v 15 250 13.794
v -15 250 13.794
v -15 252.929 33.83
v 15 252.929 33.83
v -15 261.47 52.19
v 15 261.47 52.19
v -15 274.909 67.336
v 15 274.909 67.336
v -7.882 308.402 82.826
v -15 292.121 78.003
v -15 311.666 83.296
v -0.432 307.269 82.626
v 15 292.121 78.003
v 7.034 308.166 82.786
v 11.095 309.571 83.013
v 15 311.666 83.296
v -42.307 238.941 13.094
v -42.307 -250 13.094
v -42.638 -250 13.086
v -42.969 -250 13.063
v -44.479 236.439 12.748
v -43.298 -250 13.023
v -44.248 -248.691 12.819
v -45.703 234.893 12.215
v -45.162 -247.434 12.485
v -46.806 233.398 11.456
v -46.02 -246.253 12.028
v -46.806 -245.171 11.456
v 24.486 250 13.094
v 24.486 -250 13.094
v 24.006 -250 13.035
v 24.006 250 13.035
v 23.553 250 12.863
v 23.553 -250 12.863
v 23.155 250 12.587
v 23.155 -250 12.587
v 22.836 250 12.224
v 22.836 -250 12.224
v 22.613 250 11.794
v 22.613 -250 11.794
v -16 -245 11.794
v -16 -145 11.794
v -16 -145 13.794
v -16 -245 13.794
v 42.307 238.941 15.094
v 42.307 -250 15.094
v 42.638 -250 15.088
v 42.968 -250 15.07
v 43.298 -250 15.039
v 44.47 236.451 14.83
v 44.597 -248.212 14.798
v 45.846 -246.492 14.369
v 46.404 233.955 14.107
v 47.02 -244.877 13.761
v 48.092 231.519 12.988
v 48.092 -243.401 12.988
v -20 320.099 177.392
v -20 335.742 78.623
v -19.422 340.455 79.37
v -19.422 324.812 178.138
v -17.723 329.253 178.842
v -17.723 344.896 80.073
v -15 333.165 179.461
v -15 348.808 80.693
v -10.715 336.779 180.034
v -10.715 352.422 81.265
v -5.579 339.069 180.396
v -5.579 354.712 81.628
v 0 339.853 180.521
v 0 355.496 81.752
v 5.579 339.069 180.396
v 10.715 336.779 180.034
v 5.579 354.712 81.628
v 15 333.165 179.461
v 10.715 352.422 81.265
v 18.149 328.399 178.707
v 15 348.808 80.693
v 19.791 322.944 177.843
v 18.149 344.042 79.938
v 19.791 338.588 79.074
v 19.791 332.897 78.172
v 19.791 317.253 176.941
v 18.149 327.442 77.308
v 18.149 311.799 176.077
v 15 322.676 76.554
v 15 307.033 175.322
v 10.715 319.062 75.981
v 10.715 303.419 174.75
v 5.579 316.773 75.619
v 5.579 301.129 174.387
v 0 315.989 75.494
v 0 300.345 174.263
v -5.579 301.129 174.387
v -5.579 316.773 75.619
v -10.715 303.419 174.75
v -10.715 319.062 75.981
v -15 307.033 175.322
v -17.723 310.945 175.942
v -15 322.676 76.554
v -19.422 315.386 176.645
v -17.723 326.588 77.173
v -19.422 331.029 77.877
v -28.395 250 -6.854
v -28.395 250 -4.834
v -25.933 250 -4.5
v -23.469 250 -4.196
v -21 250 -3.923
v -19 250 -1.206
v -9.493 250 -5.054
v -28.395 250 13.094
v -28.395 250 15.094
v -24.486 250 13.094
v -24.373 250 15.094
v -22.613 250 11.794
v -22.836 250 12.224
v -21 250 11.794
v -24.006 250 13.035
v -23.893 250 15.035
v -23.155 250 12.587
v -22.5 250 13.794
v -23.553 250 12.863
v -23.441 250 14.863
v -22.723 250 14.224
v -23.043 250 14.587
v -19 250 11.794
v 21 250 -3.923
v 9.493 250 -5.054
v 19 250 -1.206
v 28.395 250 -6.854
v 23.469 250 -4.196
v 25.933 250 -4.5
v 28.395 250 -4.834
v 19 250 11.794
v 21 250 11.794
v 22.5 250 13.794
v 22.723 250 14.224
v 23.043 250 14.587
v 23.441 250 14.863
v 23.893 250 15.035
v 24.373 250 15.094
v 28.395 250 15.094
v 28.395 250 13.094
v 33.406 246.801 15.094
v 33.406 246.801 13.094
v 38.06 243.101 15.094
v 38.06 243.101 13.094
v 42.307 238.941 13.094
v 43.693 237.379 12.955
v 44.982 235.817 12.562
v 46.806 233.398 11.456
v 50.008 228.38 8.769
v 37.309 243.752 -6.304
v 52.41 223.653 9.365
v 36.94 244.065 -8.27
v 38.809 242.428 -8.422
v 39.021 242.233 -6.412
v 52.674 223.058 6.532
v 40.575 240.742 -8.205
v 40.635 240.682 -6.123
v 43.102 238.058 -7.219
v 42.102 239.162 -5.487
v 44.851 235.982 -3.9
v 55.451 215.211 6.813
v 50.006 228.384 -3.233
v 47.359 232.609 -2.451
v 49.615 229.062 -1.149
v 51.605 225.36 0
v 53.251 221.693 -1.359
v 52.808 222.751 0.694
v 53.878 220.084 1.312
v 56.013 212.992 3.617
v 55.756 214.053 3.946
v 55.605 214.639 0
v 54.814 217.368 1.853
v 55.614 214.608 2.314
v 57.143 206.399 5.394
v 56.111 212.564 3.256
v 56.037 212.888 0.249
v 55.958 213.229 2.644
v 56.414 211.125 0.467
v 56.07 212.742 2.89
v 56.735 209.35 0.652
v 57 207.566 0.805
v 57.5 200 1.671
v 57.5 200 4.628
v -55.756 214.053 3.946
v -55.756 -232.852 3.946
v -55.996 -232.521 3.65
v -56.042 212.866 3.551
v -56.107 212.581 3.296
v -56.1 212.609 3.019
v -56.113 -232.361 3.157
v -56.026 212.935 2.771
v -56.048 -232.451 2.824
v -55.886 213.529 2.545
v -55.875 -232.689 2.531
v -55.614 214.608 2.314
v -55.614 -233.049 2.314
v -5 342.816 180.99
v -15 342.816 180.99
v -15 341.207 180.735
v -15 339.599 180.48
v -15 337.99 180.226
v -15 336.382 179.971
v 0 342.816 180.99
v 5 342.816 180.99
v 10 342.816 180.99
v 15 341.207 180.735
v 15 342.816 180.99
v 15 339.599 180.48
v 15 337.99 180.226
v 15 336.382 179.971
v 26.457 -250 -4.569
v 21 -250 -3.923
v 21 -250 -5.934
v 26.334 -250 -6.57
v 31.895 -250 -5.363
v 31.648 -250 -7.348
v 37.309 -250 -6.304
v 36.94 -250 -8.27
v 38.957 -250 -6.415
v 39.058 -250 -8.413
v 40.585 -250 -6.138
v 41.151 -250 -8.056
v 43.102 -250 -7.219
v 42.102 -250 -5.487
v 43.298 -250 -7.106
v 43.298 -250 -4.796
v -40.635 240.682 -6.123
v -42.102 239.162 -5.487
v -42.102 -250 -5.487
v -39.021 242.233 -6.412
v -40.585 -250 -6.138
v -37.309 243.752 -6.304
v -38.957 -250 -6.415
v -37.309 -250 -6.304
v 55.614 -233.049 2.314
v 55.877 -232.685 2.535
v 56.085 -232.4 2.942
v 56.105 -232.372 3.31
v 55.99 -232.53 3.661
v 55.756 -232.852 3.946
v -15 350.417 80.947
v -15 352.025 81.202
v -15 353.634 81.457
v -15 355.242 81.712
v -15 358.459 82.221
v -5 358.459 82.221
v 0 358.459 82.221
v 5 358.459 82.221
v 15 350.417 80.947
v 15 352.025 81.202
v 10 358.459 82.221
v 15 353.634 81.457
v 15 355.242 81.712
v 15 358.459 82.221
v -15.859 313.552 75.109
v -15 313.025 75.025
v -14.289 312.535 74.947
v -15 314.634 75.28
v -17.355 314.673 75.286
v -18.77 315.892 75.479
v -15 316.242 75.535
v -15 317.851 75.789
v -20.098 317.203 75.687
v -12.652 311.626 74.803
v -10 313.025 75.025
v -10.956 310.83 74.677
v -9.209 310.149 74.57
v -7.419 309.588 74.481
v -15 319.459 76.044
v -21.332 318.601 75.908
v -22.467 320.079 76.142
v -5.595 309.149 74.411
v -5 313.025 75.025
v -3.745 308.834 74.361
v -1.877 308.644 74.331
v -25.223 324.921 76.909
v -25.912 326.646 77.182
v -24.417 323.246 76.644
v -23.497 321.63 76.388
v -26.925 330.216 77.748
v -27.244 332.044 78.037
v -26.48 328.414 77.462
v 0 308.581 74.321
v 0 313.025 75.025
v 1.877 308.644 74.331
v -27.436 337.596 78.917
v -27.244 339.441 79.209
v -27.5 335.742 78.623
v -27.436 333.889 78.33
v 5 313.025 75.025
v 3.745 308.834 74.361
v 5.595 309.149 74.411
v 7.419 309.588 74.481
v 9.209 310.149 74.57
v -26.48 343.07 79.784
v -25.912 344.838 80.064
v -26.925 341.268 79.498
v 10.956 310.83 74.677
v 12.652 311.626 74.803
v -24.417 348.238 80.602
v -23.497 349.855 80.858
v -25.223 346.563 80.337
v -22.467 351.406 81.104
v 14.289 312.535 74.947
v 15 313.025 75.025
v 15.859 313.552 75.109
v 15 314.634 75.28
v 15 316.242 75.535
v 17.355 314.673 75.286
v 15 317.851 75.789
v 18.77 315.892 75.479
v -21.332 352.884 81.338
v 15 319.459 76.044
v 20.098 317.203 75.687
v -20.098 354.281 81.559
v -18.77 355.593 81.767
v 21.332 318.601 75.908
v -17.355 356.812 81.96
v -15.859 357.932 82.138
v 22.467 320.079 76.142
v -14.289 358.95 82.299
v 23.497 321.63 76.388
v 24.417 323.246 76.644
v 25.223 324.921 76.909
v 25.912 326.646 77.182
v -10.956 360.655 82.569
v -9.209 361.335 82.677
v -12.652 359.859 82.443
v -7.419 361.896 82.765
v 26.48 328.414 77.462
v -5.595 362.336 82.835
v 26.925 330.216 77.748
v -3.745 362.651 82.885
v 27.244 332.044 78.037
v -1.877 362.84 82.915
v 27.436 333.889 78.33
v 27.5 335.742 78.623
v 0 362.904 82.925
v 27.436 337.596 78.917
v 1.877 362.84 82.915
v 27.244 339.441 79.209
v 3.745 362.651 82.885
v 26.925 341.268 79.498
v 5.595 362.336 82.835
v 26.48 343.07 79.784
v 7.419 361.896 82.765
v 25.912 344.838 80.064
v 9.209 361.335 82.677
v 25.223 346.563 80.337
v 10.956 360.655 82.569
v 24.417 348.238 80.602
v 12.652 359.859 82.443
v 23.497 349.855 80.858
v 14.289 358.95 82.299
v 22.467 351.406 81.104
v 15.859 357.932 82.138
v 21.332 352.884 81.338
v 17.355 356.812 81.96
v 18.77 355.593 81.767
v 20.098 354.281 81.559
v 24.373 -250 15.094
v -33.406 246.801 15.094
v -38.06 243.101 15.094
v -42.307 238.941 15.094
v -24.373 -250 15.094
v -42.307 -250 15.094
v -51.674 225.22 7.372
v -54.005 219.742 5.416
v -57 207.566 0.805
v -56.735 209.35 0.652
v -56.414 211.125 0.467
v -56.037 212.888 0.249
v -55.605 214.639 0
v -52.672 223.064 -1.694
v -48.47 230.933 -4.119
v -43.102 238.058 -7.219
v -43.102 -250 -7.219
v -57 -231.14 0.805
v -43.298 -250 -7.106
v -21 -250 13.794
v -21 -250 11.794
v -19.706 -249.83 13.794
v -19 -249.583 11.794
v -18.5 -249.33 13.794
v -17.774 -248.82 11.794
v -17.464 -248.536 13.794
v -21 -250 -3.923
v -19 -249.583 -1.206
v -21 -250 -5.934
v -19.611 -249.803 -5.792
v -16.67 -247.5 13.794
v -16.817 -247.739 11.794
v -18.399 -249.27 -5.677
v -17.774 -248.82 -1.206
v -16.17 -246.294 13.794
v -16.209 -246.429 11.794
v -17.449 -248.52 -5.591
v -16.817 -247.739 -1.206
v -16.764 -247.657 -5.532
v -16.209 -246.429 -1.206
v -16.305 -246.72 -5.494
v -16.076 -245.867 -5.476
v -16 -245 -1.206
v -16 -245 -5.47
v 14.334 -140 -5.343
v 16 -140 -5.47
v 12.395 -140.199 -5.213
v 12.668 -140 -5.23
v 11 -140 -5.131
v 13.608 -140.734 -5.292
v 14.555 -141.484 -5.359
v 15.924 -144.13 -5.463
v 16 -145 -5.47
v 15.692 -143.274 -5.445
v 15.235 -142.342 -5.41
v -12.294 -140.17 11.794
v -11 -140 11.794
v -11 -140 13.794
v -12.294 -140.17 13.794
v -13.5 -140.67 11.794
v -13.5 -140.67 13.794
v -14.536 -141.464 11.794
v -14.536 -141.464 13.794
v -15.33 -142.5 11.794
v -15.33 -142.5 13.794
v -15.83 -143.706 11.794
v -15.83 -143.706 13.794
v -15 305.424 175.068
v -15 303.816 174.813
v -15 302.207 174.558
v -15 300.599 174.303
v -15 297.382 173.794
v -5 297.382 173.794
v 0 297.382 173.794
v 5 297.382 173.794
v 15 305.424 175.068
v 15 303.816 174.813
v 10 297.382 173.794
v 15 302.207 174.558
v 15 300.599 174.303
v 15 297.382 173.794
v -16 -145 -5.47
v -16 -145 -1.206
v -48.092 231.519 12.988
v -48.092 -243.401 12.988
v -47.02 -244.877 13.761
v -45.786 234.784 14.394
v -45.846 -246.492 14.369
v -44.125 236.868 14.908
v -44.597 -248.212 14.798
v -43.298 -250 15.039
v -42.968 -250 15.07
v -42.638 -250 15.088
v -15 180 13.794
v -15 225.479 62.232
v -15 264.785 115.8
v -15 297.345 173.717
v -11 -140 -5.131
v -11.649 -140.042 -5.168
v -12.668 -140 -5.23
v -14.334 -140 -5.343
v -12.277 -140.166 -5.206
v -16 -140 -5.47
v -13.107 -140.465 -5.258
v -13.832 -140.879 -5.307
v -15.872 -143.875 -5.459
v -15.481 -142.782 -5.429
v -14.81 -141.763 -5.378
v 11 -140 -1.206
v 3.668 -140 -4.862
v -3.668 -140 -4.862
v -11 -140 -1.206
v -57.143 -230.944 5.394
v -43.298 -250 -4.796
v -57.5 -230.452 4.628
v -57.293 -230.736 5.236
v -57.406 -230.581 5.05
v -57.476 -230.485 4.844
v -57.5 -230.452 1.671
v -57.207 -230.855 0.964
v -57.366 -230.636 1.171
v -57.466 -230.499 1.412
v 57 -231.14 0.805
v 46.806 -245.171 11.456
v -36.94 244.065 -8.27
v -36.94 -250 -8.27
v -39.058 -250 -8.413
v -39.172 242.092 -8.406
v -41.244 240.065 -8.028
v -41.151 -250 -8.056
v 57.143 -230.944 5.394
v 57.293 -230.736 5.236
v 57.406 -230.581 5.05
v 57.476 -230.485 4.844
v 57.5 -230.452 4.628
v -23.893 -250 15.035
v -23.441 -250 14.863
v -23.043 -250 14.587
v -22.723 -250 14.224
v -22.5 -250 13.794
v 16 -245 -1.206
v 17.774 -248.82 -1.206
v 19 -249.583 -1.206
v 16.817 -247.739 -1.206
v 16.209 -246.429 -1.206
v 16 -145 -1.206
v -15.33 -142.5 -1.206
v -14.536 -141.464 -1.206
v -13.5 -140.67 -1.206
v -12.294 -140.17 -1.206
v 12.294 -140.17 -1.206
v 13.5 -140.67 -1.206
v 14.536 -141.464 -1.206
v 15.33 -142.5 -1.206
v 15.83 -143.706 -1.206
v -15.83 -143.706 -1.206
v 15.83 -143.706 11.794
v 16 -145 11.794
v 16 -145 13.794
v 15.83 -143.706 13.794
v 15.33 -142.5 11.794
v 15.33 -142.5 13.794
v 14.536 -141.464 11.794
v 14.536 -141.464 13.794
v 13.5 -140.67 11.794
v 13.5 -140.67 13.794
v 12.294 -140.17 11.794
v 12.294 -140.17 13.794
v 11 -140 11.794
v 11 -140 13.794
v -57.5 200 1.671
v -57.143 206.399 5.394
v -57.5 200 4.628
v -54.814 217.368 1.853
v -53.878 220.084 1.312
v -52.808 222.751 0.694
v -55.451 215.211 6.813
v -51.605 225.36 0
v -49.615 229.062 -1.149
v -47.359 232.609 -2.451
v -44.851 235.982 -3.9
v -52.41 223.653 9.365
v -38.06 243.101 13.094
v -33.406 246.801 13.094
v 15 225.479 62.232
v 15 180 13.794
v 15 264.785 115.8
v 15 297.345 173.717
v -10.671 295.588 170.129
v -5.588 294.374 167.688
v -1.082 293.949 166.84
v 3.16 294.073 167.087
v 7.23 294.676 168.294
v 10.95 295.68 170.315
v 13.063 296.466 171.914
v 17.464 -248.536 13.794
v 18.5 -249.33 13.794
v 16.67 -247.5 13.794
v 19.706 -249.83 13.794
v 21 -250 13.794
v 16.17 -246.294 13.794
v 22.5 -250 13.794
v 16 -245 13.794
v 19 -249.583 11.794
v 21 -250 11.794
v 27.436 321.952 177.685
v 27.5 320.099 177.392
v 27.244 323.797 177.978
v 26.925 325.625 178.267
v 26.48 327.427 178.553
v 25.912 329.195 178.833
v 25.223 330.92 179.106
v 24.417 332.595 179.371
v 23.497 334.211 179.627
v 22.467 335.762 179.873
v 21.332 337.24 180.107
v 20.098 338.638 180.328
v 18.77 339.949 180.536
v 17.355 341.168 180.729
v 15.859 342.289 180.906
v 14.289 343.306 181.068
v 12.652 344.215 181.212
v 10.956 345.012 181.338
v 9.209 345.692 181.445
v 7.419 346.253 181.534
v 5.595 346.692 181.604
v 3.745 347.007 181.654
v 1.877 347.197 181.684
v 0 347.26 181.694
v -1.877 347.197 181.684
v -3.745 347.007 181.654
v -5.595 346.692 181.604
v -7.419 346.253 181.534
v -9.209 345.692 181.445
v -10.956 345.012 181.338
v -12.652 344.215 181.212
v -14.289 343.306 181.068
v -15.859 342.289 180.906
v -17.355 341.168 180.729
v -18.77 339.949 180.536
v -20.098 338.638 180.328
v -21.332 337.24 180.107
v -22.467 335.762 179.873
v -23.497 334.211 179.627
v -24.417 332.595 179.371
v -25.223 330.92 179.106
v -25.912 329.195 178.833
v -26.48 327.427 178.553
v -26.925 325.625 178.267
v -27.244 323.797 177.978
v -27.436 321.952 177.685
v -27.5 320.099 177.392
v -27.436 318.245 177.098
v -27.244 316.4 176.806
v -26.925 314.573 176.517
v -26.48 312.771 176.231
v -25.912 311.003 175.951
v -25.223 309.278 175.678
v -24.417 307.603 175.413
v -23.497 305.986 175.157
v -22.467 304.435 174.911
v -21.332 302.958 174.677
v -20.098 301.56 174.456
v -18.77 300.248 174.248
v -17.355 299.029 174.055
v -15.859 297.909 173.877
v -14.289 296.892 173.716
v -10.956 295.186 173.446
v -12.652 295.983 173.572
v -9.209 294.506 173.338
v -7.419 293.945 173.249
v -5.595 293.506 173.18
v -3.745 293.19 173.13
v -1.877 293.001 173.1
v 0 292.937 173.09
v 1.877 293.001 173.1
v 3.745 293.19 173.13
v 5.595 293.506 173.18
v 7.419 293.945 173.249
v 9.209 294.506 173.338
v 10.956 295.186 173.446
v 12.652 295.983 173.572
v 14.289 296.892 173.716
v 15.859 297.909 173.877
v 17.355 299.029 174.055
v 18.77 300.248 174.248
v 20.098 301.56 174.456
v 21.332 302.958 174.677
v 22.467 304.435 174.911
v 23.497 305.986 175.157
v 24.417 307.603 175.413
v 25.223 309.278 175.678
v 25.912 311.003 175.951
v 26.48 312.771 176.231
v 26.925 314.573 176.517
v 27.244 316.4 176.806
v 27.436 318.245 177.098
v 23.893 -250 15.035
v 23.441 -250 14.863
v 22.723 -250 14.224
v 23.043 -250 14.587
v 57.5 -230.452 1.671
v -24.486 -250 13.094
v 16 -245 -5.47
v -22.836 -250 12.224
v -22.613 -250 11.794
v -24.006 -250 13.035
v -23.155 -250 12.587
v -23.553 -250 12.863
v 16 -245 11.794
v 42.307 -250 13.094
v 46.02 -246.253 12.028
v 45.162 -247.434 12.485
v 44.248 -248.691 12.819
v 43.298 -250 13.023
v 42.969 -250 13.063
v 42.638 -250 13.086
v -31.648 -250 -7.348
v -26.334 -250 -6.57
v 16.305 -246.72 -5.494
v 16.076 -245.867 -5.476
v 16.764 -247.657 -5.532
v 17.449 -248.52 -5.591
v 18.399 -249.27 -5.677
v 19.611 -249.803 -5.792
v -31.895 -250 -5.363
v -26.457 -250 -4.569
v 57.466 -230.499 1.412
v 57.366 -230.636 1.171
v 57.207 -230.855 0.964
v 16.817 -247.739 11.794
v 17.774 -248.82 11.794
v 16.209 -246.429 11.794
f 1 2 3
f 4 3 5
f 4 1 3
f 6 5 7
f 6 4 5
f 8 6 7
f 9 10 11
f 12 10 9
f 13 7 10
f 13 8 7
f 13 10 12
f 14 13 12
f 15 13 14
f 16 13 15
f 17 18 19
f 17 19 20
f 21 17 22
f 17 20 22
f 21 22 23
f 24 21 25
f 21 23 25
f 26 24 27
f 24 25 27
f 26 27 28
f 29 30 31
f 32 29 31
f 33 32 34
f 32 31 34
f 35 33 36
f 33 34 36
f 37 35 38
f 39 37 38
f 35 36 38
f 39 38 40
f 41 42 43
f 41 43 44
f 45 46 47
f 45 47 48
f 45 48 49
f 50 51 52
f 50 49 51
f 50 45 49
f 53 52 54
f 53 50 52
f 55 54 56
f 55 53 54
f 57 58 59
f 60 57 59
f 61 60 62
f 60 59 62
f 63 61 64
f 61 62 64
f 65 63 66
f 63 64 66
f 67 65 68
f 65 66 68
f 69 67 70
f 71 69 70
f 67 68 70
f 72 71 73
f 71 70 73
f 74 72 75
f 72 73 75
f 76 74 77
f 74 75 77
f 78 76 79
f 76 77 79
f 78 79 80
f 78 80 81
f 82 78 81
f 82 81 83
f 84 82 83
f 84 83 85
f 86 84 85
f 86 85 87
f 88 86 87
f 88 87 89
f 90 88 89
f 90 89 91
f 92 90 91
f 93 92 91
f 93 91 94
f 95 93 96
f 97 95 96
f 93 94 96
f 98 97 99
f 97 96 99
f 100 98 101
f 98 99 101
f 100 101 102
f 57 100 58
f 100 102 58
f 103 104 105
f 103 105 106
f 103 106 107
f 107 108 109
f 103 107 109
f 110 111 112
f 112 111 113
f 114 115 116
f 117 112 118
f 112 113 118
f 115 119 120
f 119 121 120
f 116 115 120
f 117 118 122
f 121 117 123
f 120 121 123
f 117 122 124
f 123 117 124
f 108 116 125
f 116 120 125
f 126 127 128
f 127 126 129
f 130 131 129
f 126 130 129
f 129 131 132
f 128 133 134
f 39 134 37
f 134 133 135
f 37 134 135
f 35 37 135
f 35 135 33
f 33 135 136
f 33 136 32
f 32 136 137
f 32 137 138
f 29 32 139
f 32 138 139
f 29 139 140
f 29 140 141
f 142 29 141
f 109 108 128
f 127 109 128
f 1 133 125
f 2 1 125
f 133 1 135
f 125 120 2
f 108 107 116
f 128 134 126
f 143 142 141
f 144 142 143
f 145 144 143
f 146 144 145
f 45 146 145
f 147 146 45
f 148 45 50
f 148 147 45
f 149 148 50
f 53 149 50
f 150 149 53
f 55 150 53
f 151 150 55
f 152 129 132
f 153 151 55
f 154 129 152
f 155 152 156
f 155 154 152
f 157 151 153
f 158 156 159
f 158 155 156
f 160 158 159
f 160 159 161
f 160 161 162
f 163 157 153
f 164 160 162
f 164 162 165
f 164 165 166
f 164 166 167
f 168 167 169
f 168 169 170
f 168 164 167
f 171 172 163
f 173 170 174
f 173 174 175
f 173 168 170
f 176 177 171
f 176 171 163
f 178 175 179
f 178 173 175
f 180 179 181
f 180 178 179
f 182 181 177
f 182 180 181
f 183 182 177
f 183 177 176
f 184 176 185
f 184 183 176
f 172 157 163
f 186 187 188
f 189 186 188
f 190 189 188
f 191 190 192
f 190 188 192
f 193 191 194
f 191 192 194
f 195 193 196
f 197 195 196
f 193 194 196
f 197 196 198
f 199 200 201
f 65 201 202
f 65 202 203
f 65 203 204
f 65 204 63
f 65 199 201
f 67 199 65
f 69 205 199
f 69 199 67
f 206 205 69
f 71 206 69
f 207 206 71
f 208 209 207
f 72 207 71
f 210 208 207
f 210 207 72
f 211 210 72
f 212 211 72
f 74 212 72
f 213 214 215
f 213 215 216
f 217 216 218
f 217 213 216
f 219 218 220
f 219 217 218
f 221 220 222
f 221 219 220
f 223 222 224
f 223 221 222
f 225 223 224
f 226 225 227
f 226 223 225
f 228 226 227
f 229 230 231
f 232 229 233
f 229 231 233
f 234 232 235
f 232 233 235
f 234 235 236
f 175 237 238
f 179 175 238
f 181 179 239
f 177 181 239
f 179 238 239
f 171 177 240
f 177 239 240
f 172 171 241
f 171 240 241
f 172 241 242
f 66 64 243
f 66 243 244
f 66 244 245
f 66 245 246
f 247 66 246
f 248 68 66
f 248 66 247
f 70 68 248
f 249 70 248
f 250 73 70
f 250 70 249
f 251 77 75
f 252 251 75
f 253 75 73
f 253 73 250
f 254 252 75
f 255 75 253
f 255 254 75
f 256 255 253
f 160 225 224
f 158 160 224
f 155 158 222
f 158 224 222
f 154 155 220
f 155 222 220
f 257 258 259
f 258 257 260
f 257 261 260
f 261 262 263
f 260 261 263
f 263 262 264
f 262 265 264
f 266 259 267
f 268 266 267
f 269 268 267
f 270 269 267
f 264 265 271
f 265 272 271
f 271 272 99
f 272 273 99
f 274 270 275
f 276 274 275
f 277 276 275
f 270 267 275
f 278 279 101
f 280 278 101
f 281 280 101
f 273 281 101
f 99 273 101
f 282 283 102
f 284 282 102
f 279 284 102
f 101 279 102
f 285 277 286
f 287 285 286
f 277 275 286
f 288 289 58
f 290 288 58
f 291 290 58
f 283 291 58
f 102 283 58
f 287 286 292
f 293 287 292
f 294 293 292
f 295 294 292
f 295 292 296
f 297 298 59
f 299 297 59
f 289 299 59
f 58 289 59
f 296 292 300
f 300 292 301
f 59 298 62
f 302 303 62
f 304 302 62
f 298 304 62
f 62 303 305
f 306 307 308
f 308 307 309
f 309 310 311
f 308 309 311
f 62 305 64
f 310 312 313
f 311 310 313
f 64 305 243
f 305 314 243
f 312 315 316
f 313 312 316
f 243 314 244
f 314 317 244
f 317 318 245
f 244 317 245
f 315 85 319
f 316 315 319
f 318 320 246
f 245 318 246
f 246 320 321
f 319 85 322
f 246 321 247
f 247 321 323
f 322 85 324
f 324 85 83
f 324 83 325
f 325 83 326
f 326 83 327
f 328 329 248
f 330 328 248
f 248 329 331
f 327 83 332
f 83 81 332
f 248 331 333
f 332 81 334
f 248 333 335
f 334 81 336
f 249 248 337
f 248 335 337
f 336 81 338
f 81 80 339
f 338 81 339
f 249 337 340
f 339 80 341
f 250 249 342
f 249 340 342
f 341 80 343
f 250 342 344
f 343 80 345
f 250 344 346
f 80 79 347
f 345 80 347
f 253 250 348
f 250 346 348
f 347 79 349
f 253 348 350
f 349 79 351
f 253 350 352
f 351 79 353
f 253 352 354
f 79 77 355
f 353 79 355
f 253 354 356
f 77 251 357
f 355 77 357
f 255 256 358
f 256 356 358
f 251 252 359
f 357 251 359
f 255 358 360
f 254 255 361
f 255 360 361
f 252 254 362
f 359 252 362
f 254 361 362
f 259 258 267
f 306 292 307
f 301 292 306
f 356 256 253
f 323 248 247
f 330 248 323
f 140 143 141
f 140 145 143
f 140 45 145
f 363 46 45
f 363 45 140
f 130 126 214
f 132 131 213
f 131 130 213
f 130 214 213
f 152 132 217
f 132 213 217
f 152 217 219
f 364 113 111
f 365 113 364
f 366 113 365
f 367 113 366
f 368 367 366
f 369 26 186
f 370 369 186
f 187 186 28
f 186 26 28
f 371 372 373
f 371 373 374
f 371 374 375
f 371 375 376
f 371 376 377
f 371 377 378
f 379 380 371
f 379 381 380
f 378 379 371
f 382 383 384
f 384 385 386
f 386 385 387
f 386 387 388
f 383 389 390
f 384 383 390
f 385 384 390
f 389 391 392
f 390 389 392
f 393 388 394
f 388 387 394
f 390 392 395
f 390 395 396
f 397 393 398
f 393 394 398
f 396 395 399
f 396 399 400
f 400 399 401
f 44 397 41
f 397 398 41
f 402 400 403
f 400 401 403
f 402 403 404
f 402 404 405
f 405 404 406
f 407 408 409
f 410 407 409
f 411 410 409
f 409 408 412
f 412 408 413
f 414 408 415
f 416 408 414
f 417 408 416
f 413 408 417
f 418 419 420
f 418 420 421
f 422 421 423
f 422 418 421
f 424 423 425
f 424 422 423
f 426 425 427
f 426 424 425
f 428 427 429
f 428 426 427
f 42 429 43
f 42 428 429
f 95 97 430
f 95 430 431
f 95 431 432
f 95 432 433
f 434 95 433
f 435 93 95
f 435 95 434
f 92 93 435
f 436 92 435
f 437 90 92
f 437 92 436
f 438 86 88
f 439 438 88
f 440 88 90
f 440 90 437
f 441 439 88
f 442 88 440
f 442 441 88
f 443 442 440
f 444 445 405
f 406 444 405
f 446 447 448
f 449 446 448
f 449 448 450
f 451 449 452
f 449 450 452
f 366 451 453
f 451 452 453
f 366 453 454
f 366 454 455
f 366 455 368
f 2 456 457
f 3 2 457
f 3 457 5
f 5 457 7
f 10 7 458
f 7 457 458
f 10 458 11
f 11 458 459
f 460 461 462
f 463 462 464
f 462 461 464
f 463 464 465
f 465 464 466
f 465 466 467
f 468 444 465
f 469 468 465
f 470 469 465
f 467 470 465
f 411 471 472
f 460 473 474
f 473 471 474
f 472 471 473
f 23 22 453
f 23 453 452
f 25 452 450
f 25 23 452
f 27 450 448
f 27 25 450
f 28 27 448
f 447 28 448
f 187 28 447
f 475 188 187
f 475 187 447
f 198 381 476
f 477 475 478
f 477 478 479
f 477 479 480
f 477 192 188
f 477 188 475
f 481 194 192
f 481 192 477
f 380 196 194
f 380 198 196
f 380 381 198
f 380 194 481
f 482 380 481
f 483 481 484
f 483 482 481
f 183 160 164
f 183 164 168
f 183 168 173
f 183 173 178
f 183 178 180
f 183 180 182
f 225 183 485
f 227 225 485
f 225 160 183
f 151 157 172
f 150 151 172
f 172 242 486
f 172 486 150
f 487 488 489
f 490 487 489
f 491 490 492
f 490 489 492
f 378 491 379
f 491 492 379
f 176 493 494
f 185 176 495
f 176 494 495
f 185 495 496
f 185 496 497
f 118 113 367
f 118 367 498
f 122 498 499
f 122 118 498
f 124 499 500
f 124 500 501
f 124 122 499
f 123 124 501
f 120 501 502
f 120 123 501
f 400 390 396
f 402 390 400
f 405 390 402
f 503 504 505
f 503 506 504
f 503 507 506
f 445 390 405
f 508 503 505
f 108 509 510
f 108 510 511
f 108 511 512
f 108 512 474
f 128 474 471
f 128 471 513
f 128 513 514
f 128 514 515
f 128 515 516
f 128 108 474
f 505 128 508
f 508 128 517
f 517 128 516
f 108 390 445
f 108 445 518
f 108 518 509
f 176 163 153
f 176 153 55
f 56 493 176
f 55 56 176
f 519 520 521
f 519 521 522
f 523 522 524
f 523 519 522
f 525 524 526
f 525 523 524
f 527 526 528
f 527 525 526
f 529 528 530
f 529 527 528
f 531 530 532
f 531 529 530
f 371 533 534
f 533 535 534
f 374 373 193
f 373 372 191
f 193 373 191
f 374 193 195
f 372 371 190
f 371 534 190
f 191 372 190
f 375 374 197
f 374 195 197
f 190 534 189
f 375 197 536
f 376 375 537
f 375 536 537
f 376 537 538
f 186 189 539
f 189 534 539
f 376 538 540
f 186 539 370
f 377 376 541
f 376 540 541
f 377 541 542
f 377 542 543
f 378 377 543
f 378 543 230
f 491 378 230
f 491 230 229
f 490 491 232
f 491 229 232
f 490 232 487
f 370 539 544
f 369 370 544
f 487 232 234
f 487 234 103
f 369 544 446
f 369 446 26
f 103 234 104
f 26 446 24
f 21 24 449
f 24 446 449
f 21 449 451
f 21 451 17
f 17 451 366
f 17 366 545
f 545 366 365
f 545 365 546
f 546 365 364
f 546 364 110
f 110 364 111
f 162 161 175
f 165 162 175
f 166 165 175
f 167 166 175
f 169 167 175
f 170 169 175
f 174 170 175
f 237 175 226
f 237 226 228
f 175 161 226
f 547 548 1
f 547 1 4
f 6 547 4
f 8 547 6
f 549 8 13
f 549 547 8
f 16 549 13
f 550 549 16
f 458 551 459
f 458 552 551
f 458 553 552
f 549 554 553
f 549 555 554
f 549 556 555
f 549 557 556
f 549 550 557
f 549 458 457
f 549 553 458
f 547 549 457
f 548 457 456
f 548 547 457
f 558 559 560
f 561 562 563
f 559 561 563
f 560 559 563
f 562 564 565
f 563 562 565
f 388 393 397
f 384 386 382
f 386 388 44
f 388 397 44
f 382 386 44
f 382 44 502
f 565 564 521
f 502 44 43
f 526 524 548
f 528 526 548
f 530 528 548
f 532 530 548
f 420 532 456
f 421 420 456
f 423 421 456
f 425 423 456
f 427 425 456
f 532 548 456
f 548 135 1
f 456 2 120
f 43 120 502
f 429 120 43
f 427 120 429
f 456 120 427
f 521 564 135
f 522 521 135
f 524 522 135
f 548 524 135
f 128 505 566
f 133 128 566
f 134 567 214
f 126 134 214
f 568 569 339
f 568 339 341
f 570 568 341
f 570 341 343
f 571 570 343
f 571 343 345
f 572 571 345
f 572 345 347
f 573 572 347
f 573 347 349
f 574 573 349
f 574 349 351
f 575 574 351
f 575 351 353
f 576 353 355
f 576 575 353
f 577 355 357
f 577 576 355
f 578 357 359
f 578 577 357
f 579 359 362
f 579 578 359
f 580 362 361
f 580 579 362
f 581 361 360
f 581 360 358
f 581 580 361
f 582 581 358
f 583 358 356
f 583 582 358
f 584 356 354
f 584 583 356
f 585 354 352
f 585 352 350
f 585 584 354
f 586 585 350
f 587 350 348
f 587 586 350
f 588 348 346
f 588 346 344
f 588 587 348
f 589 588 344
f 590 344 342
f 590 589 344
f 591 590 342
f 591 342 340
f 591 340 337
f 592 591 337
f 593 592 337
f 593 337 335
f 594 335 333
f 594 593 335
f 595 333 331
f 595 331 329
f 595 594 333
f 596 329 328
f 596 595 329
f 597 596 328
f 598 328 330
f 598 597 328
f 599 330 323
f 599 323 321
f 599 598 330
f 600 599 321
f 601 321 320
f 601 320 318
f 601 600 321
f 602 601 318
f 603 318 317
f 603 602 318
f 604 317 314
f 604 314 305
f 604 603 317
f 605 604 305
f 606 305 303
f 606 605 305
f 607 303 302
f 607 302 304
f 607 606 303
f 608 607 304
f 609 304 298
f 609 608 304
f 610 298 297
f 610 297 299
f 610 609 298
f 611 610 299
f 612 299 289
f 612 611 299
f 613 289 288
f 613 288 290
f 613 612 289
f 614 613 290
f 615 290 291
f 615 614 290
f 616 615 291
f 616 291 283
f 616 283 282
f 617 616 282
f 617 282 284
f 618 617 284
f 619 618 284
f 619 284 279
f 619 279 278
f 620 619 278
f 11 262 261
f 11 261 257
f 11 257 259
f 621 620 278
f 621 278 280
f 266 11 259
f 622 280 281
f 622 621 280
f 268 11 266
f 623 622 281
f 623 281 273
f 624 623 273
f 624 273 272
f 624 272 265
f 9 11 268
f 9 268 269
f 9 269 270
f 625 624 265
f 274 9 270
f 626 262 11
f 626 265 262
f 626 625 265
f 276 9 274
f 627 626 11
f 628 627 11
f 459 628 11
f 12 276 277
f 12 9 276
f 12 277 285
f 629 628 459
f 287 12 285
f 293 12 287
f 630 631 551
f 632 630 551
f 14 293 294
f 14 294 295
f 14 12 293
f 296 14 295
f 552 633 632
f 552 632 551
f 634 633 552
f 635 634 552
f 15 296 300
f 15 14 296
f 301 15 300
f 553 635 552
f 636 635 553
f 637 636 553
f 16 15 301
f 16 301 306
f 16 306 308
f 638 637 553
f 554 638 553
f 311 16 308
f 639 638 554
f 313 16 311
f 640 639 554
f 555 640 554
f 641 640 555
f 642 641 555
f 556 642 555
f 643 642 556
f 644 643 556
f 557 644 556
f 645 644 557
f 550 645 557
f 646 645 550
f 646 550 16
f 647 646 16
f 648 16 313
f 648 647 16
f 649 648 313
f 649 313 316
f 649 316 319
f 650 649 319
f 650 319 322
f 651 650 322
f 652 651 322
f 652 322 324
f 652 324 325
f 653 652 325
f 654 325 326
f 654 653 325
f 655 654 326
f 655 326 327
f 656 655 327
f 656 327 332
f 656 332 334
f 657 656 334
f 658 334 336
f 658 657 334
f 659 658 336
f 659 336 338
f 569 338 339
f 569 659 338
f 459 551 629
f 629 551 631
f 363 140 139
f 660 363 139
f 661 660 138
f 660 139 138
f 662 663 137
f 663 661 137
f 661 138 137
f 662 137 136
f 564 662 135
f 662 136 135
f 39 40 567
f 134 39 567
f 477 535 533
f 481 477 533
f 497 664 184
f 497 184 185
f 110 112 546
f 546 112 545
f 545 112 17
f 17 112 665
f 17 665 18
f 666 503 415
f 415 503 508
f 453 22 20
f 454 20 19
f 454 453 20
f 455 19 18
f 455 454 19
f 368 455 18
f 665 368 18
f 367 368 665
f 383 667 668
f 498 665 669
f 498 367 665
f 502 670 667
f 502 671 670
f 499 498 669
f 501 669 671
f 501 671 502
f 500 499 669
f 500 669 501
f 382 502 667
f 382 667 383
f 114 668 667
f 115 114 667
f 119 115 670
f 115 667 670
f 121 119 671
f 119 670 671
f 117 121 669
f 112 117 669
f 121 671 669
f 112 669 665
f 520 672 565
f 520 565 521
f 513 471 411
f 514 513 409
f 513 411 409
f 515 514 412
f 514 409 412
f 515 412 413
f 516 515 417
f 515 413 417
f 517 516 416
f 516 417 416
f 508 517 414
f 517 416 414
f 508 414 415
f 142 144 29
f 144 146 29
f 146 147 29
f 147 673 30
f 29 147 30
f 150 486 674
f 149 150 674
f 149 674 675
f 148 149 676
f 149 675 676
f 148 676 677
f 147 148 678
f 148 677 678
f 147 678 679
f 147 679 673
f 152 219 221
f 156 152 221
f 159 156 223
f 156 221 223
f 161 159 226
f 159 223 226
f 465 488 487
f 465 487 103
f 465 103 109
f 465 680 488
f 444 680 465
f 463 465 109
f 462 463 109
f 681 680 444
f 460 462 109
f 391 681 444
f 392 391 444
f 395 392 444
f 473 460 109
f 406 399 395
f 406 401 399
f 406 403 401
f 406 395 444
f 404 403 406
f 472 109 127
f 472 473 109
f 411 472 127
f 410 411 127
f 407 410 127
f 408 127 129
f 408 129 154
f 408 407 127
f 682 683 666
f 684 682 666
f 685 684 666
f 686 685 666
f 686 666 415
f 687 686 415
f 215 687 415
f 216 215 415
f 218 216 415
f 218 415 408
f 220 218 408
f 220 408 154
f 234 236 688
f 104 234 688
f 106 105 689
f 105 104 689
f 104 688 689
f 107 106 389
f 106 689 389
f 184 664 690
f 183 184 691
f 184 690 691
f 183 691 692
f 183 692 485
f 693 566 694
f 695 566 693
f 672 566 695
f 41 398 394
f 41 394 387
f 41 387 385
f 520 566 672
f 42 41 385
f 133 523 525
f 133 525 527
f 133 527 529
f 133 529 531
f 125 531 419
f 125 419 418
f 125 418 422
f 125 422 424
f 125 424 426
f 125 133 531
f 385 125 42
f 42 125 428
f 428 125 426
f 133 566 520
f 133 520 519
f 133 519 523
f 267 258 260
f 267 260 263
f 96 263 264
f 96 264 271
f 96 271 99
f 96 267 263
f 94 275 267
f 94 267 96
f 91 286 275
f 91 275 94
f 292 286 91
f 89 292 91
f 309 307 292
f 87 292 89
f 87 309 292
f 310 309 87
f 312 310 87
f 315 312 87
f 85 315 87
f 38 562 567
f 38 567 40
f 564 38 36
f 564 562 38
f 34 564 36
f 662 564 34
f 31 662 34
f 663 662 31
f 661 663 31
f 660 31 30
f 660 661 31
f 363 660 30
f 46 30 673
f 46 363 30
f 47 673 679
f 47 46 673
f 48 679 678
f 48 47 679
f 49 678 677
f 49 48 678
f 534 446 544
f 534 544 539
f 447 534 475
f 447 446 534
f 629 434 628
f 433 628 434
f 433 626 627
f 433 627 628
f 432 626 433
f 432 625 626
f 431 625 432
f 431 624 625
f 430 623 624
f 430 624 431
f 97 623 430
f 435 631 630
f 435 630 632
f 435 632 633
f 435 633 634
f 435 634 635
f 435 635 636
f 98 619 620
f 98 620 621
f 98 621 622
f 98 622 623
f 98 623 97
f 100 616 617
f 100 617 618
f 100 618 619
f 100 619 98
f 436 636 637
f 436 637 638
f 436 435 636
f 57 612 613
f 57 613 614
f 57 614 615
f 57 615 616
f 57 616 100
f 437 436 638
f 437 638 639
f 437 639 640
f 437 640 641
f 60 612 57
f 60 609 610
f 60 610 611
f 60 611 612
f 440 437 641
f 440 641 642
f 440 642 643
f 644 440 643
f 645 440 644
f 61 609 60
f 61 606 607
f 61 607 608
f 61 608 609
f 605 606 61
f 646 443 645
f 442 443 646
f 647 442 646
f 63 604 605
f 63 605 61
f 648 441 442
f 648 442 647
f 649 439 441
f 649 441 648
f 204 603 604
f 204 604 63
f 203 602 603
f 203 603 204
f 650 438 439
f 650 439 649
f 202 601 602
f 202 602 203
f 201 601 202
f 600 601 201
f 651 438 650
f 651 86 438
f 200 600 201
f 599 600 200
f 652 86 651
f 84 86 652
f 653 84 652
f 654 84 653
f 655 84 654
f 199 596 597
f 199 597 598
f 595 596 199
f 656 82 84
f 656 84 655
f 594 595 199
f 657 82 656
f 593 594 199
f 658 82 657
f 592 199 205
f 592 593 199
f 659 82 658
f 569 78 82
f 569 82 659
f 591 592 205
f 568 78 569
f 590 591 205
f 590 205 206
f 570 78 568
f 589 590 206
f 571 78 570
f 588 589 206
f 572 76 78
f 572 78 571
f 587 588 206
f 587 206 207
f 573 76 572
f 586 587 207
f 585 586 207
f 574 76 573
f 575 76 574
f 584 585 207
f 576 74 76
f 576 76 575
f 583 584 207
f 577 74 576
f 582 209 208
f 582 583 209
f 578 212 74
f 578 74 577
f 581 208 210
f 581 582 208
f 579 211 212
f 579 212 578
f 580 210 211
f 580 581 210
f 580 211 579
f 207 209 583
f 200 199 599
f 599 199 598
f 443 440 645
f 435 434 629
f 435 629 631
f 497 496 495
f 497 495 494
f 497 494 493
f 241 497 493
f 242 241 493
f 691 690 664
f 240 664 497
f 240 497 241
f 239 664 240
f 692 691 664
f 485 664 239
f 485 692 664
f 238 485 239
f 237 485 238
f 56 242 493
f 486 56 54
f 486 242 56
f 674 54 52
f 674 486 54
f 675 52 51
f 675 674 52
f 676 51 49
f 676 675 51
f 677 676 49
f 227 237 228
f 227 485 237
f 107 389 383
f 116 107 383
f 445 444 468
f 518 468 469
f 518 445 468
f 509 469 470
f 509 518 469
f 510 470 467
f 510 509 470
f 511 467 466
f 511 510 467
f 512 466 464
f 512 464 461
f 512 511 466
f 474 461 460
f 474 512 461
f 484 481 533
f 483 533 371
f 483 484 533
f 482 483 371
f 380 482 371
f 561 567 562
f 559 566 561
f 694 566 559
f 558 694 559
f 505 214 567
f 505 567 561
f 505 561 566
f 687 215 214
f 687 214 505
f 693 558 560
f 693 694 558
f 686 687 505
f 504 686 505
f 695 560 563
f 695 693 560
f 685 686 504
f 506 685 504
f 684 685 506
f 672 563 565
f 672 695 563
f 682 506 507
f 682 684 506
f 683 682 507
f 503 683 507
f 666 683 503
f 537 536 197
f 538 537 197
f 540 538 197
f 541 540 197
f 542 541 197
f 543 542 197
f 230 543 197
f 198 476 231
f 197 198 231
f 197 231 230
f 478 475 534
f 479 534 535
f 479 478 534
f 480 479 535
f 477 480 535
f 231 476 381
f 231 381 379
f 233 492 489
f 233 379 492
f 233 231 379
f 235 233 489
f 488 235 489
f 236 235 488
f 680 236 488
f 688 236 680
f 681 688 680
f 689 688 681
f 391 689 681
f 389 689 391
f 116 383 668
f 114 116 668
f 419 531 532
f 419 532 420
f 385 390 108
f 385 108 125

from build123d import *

# Parameters (mm, degrees)
F1_DEPTH       = 250
F2_W           = 38
F2_H           = 13
F3_DEPTH       = 500.001
F4_T1_DEPTH    = 509.3674969976
F5_R           = 9
F6_R           = 1
F8_DEPTH       = 500.001
F10_DEPTH      = 8.4253865001
F10_DEPTH_BACK = 15.0949186811
F12_DEPTH      = 15
F13_R          = 27.5
F14_DEPTH      = 100
F16_D          = 40
F18_DEPTH      = 8.4253866128
F18_DEPTH_BACK = 181.6948592657
F19_T1_DEPTH   = 2
F19_T6_DEPTH   = 16.7634824315
F19_S7_R       = 200
F19_T8_DEPTH   = 11
F19_T12_DEPTH  = 16.7634824315
F19_S13_R      = 200
F19_T14_DEPTH  = 11
F19_T15_DEPTH  = 27
F19_T17_DEPTH  = 29.2634824315


# Not quite as in the source:
# - a fillet or chamfer that OpenCascade refuses, or shapes differently, is made with other operations: its cross-section is extruded or revolved along the edge and cut away or added


with BuildPart() as f1:
    # F0 (on Front) → F1 (new body, symmetric)
    with BuildSketch(Plane.XZ):
        with BuildLine():
            Line((22.5, 13.7939186811), (0, 13.7939186811))
            Line((0, 13.7939186811), (-22.5, 13.7939186811))
            Line((-22.5, 13.7939186811), (-22.5, 15.0939186811))
            Line((-22.5, 15.0939186811), (-45.5824640741, 15.0939186811))
            Line((-45.5824640741, 15.0939186811), (-57.5, 5.0939186811))
            Line((-57.5, 5.0939186811), (-57.5, 1.0939186811))
            Line((-57.5, 1.0939186811), (-40.1794919243, -8.9060813189))
            ThreePointArc((-40.1794919243, -8.9060813189), (0, -4.8285364604), (40.1794919243, -8.9060813189))
            Line((40.1794919243, -8.9060813189), (57.5, 1.0939186811))
            Line((57.5, 1.0939186811), (57.5, 5.0939186811))
            Line((57.5, 5.0939186811), (45.5824640741, 15.0939186811))
            Line((45.5824640741, 15.0939186811), (22.5, 15.0939186811))
            Line((22.5, 15.0939186811), (22.5, 13.7939186811))
        make_face()
    extrude(amount=F1_DEPTH, both=True)

    # F2 (on face) → F3 (cut, through all)
    with BuildSketch(Plane.XZ.offset(250)):
        with Locations((0, 5.2939186811)):
            Rectangle(F2_W, F2_H)
    extrude(amount=-F3_DEPTH, mode=Mode.SUBTRACT)

    # F4: fillet of radius 2 on 2 edges, made by hand

    # F4_s2 → F4_t1 (cut)
    with BuildSketch(Plane.XZ.offset(-254.6837484988)):
        with BuildLine():
            ThreePointArc((24.3734993995, 15.0939186811), (23.2333239744, 14.7370863537), (22.5, 13.7939186811))
            Line((22.5, 13.7939186811), (22.5, 15.0939186811))
            Line((22.5, 15.0939186811), (24.3734993995, 15.0939186811))
        make_face()
        with BuildLine():
            ThreePointArc((-24.3734993995, 15.0939186811), (-23.2333239744, 14.7370863537), (-22.5, 13.7939186811))
            Line((-22.5, 13.7939186811), (-22.5, 15.0939186811))
            Line((-22.5, 15.0939186811), (-24.3734993995, 15.0939186811))
        make_face()
    extrude(amount=F4_T1_DEPTH, mode=Mode.SUBTRACT)

    # F5
    f5_edges = [f1.edges().sort_by_distance(p)[0] for p in [
        (45.582464, 0, 15.093919),
        (-45.582464, 0, 15.093919),
        (-40.179492, 0, -8.906081),
        (40.179492, 0, -8.906081),
    ]]
    fillet(f5_edges, radius=F5_R)

    # F6
    f6_edges = [f1.edges().sort_by_distance(p)[0] for p in [
        (57.5, 0, 1.093919),
        (57.5, 0, 5.093919),
        (-57.5, 0, 5.093919),
        (-57.5, 0, 1.093919),
    ]]
    fillet(f6_edges, radius=F6_R)

    # F7 (on face) → F8 (cut, through all)
    with BuildSketch(Plane.XZ.offset(250)):
        with BuildLine():
            Line((-55.6135241478, 2.3141624168), (-42.1022690923, -5.4865643266))
            ThreePointArc((-42.1022690923, -5.4865643266), (-39.7790673433, -6.3247593796), (-37.3093701274, -6.3039513313))
            ThreePointArc((-37.3093701274, -6.3039513313), (-29.1789785809, -4.9471035834), (-21, -3.9230860615))
            Line((-21, -3.9230860615), (-21, 11.7939186811))
            Line((-21, 11.7939186811), (-22.6125713953, 11.7939186811))
            ThreePointArc((-22.6125713953, 11.7939186811), (-23.3458953697, 12.7370863537), (-24.4860707948, 13.0939186811))
            Line((-24.4860707948, 13.0939186811), (-42.3067319657, 13.0939186811))
            ThreePointArc((-42.3067319657, 13.0939186811), (-44.7008729689, 12.6717670266), (-46.8062452335, 11.456229783))
            Line((-46.8062452335, 11.456229783), (-55.7563117574, 3.9462322637))
            ThreePointArc((-55.7563117574, 3.9462322637), (-56.1097188459, 3.0930320778), (-55.6135241478, 2.3141624168))
        make_face()
        with BuildLine():
            ThreePointArc((21, -3.9230860615), (29.1789785809, -4.9471035834), (37.3093701274, -6.3039513313))
            ThreePointArc((37.3093701274, -6.3039513313), (39.7790673433, -6.3247593796), (42.1022690923, -5.4865643266))
            Line((42.1022690923, -5.4865643266), (55.6135241478, 2.3141624168))
            ThreePointArc((55.6135241478, 2.3141624168), (56.1097188459, 3.0930320778), (55.7563117574, 3.9462322637))
            Line((55.7563117574, 3.9462322637), (46.8062452335, 11.456229783))
            ThreePointArc((46.8062452335, 11.456229783), (44.7008729689, 12.6717670266), (42.3067319657, 13.0939186811))
            Line((42.3067319657, 13.0939186811), (24.4860707948, 13.0939186811))
            ThreePointArc((24.4860707948, 13.0939186811), (23.3458953697, 12.7370863537), (22.6125713953, 11.7939186811))
            Line((22.6125713953, 11.7939186811), (21, 11.7939186811))
            Line((21, 11.7939186811), (21, -3.9230860615))
        make_face()
    extrude(amount=-F8_DEPTH, mode=Mode.SUBTRACT)

    # F9 (on Top) → F10 (cut, two sides)
    with BuildSketch(Plane.XY) as f10_sk:
        with BuildLine():
            ThreePointArc((-57.5, 200), (0, 257.5), (57.5, 200))
            Line((57.5, 200), (57.5, 280))
            Line((57.5, 280), (-57.5, 280))
            Line((-57.5, 280), (-57.5, 200))
        make_face()
    extrude(amount=-F10_DEPTH, mode=Mode.SUBTRACT)
    extrude(f10_sk.sketch, amount=F10_DEPTH_BACK, mode=Mode.SUBTRACT)

    # F11 (on Right) → F12 (join, symmetric)
    with BuildSketch(Plane.YZ):
        with BuildLine():
            ThreePointArc((297.3819995028, 173.7939186811), (245.9666940414, 88.4561965341), (180, 13.7939186811))
            Line((180, 13.7939186811), (250, 13.7939186811))
            ThreePointArc((250, 13.7939186811), (267.6550746197, 60.2698133678), (311.7145367693, 83.3018398057))
            Line((311.7145367693, 83.3018398057), (313.0254460068, 75.0250846216))
            Line((313.0254460068, 75.0250846216), (358.4591096742, 82.2210700135))
            Line((358.4591096742, 82.2210700135), (342.8156631702, 180.989904073))
            Line((342.8156631702, 180.989904073), (297.3819995028, 173.7939186811))
        make_face()
    extrude(amount=F12_DEPTH, both=True)

    # F13 (on face) → F14 (join, through all)
    with BuildSketch(Plane(origin=(0, -19.5751816724, 123.5928329339), x_dir=(1, 0, 0), z_dir=(0, -0.156434465, 0.9876883406))):
        with Locations((0, 343.9080923079)):
            Circle(F13_R)
    extrude(amount=-F14_DEPTH)

    # F16 (through all)
    with Locations(Plane(origin=(0, -19.5751816724, 123.5928329339), x_dir=(1, 0, 0), z_dir=(0, -0.156434465, 0.9876883406))):
        with Locations((0, 343.9080923079)):
            Hole(F16_D / 2)

    # F17 (on Top) → F18 (cut, two sides)
    with BuildSketch(Plane.XY) as f18_sk:
        Polygon((-43.2975540478, -250), (-68, -216), (-68, -346), (68, -346), (68, -216), (43.2975540478, -250), (16, -250), (16, -140), (-16, -140), (-16, -250), align=None)
    extrude(amount=-F18_DEPTH, mode=Mode.SUBTRACT)
    extrude(f18_sk.sketch, amount=F18_DEPTH_BACK, mode=Mode.SUBTRACT)

    # F19: fillet of radius 5 on 8 edges, made by hand

    # F19_s2 → F19_t1 (join)
    with BuildSketch(Plane.XY.offset(11.7939186811)):
        with BuildLine():
            ThreePointArc((-11, -140), (-14.5355339059, -141.4644660941), (-16, -145))
            Line((-16, -145), (-16, -140))
            Line((-16, -140), (-11, -140))
        make_face()
        with BuildLine():
            ThreePointArc((16, -145), (14.5355339059, -141.4644660941), (11, -140))
            Line((11, -140), (16, -140))
            Line((16, -140), (16, -145))
        make_face()
    extrude(amount=F19_T1_DEPTH)


with BuildPart() as f19_tool4:
    # F19_s5 → F19_t6 (new body)
    with BuildSketch(Plane.XY.offset(-1.2060813189)):
        with BuildLine():
            ThreePointArc((-16, -145), (-14.5355339059, -141.4644660941), (-11, -140))
            Line((-11, -140), (-16, -140))
            Line((-16, -140), (-16, -145))
        make_face()
    extrude(amount=-F19_T6_DEPTH)

    # F19_s7 → F19_t8 (cut, symmetric)
    with BuildSketch(Plane.XZ.offset(142.5)):
        with Locations((0, -204.8285364604)):
            Circle(F19_S7_R)
    extrude(amount=F19_T8_DEPTH, both=True, mode=Mode.SUBTRACT)


with BuildPart() as f1_1:
    add(f1.part)

    # F19_t3: union F19_tool4
    add(f19_tool4.part)


with BuildPart() as f19_tool10:
    # F19_s11 → F19_t12 (new body)
    with BuildSketch(Plane.XY.offset(-17.9695637504)):
        with BuildLine():
            ThreePointArc((11, -140), (14.5355339059, -141.4644660941), (16, -145))
            Line((16, -145), (16, -140))
            Line((16, -140), (11, -140))
        make_face()
    extrude(amount=F19_T12_DEPTH)

    # F19_s13 → F19_t14 (cut, symmetric)
    with BuildSketch(Plane.XZ.offset(142.5)):
        with Locations((0, -204.8285364604)):
            Circle(F19_S13_R)
    extrude(amount=F19_T14_DEPTH, both=True, mode=Mode.SUBTRACT)


with BuildPart() as f1_2:
    add(f1_1.part)

    # F19_t9: union F19_tool10
    add(f19_tool10.part)

    # F19_s16 → F19_t15 (cut)
    with BuildSketch(Plane.XY.offset(-0.7060813189)):
        with BuildLine():
            ThreePointArc((-21, -250), (-17.4644660941, -248.5355339059), (-16, -245))
            Line((-16, -245), (-16, -250))
            Line((-16, -250), (-21, -250))
        make_face()
        with BuildLine():
            ThreePointArc((21, -250), (17.4644660941, -248.5355339059), (16, -245))
            Line((16, -245), (16, -250))
            Line((16, -250), (21, -250))
        make_face()
    extrude(amount=F19_T15_DEPTH, mode=Mode.SUBTRACT)

    # F19_s18 → F19_t17 (cut)
    with BuildSketch(Plane.XY.offset(-17.9695637504)):
        with BuildLine():
            ThreePointArc((21, -250), (17.4644660941, -248.5355339059), (16, -245))
            Line((16, -245), (16, -250))
            Line((16, -250), (21, -250))
        make_face()
        with BuildLine():
            ThreePointArc((-21, -250), (-17.4644660941, -248.5355339059), (-16, -245))
            Line((-16, -245), (-16, -250))
            Line((-16, -250), (-21, -250))
        make_face()
    extrude(amount=F19_T17_DEPTH, mode=Mode.SUBTRACT)


solid = f1_2.part
